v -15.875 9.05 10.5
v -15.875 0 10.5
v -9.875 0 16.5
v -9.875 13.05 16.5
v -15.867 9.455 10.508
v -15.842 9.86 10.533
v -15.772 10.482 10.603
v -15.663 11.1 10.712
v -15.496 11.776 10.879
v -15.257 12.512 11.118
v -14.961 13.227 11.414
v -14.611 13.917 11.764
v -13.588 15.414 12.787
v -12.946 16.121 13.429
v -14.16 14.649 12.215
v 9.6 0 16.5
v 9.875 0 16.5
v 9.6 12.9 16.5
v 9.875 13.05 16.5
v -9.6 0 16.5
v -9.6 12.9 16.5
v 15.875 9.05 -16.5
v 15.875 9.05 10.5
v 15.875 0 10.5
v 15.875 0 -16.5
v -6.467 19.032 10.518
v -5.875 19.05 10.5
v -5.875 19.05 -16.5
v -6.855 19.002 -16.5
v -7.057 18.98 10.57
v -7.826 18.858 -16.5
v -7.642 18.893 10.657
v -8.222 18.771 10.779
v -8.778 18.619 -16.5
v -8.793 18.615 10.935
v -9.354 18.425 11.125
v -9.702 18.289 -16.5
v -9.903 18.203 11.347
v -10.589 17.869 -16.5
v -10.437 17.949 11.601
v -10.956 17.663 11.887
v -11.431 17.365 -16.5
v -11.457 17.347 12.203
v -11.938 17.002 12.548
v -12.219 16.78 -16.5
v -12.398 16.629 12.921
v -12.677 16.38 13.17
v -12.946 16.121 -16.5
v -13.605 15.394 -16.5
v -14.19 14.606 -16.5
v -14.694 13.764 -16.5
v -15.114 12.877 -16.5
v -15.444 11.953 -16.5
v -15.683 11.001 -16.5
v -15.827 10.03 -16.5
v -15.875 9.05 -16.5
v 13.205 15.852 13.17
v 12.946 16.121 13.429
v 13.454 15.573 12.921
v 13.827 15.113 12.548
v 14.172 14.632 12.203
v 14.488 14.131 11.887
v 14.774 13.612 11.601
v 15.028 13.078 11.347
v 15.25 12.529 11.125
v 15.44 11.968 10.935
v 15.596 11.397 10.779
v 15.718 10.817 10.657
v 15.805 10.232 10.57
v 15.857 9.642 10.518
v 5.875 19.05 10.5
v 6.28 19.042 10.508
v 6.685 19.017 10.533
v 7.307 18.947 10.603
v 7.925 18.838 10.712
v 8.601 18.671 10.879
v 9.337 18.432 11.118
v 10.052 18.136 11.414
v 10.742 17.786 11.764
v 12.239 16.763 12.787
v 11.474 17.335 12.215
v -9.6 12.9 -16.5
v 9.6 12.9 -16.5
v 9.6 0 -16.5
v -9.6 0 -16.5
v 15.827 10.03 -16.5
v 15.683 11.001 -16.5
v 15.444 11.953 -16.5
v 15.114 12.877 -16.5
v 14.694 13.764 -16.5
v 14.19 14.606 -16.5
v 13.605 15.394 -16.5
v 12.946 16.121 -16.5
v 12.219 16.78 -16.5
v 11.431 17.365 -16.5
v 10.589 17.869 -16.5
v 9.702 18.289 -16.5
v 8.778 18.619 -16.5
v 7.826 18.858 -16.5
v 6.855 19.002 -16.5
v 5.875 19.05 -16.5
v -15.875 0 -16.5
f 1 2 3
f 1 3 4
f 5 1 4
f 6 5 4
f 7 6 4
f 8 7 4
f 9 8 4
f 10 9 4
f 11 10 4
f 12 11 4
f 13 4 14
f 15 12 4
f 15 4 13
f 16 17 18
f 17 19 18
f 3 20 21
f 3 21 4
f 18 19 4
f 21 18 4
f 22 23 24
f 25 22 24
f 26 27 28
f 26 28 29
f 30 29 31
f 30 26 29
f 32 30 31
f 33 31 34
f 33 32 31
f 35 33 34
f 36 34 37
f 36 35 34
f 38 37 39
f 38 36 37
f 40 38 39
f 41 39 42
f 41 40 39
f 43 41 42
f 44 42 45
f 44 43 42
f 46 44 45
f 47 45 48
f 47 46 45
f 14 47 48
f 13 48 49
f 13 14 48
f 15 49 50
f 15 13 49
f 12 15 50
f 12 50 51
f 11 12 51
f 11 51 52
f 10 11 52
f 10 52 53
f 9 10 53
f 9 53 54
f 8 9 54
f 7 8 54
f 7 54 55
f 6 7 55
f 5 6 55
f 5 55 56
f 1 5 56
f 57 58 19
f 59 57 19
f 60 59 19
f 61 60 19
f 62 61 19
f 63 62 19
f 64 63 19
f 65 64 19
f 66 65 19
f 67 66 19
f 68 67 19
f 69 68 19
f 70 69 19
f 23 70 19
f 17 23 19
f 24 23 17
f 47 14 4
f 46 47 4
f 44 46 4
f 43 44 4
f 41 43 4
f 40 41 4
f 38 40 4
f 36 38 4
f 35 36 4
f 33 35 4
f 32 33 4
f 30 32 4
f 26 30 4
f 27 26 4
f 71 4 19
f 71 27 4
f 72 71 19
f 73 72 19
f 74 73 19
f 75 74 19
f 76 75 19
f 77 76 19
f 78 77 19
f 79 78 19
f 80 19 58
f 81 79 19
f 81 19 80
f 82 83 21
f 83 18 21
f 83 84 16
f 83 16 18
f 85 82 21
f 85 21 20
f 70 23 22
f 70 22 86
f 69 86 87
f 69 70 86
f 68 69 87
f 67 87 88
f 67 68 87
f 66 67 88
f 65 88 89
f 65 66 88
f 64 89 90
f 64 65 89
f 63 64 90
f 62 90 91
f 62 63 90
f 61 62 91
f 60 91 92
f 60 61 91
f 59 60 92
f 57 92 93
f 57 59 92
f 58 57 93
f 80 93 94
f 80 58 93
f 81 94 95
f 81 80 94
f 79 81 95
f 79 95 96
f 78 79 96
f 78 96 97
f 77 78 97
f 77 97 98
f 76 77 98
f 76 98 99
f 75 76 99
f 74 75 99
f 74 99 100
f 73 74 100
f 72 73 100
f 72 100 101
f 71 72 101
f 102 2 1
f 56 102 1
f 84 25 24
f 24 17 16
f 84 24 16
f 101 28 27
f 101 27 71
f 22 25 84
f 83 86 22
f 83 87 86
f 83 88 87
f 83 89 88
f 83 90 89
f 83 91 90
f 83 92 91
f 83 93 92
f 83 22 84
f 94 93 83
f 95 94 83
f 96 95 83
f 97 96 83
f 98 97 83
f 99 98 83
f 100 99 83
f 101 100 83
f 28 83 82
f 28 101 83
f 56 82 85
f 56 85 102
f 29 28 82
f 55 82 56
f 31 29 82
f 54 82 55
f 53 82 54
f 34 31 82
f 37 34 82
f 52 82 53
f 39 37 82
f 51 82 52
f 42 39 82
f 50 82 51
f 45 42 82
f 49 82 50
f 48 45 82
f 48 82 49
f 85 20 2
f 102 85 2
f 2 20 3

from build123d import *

# Parameters (mm, degrees)
BOSS_EXTRUDE1_DEPTH = 16.5
CHAMFER1_SIZE       = 6
FILLET1_R           = 10


with BuildPart() as part:
    # Sketch1 → Boss-Extrude1 (new, symmetric)
    with BuildSketch(Plane.XY):
        Polygon((15.875, 0), (9.6, 0), (9.6, 12.9), (-9.6, 12.9), (-9.6, 0), (-15.875, 0), (-15.875, 19.05), (15.875, 19.05), align=None)
    extrude(amount=BOSS_EXTRUDE1_DEPTH, both=True)

    # Chamfer1
    chamfer1_edges = [part.edges().sort_by_distance(p)[0] for p in [
        (15.875, 9.525, 16.5),
        (0, 19.05, 16.5),
        (-15.875, 9.525, 16.5),
    ]]
    chamfer(chamfer1_edges, length=CHAMFER1_SIZE)

    # Fillet1
    fillet1_edges = [part.edges().sort_by_distance(p)[0] for p in [
        (-15.875, 19.05, -3),
        (15.875, 19.05, -3),
    ]]
    fillet(fillet1_edges, radius=FILLET1_R)


solid = part.part
